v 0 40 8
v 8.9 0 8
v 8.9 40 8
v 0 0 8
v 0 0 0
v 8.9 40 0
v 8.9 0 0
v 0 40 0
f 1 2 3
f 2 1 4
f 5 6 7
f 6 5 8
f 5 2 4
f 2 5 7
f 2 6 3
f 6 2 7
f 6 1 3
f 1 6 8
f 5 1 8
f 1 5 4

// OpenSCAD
/** JoseA. 2014-09-21

"Base" to be used in a paint roller frame used to hold the spool of plastic. This "base" allows the roller frame to be screwed into a piece of wood. 

Use at your own risk.
*/

// consider adding guide wholes for the screws so it doesn't crack.

cube ( [8.9,40, 8]);
